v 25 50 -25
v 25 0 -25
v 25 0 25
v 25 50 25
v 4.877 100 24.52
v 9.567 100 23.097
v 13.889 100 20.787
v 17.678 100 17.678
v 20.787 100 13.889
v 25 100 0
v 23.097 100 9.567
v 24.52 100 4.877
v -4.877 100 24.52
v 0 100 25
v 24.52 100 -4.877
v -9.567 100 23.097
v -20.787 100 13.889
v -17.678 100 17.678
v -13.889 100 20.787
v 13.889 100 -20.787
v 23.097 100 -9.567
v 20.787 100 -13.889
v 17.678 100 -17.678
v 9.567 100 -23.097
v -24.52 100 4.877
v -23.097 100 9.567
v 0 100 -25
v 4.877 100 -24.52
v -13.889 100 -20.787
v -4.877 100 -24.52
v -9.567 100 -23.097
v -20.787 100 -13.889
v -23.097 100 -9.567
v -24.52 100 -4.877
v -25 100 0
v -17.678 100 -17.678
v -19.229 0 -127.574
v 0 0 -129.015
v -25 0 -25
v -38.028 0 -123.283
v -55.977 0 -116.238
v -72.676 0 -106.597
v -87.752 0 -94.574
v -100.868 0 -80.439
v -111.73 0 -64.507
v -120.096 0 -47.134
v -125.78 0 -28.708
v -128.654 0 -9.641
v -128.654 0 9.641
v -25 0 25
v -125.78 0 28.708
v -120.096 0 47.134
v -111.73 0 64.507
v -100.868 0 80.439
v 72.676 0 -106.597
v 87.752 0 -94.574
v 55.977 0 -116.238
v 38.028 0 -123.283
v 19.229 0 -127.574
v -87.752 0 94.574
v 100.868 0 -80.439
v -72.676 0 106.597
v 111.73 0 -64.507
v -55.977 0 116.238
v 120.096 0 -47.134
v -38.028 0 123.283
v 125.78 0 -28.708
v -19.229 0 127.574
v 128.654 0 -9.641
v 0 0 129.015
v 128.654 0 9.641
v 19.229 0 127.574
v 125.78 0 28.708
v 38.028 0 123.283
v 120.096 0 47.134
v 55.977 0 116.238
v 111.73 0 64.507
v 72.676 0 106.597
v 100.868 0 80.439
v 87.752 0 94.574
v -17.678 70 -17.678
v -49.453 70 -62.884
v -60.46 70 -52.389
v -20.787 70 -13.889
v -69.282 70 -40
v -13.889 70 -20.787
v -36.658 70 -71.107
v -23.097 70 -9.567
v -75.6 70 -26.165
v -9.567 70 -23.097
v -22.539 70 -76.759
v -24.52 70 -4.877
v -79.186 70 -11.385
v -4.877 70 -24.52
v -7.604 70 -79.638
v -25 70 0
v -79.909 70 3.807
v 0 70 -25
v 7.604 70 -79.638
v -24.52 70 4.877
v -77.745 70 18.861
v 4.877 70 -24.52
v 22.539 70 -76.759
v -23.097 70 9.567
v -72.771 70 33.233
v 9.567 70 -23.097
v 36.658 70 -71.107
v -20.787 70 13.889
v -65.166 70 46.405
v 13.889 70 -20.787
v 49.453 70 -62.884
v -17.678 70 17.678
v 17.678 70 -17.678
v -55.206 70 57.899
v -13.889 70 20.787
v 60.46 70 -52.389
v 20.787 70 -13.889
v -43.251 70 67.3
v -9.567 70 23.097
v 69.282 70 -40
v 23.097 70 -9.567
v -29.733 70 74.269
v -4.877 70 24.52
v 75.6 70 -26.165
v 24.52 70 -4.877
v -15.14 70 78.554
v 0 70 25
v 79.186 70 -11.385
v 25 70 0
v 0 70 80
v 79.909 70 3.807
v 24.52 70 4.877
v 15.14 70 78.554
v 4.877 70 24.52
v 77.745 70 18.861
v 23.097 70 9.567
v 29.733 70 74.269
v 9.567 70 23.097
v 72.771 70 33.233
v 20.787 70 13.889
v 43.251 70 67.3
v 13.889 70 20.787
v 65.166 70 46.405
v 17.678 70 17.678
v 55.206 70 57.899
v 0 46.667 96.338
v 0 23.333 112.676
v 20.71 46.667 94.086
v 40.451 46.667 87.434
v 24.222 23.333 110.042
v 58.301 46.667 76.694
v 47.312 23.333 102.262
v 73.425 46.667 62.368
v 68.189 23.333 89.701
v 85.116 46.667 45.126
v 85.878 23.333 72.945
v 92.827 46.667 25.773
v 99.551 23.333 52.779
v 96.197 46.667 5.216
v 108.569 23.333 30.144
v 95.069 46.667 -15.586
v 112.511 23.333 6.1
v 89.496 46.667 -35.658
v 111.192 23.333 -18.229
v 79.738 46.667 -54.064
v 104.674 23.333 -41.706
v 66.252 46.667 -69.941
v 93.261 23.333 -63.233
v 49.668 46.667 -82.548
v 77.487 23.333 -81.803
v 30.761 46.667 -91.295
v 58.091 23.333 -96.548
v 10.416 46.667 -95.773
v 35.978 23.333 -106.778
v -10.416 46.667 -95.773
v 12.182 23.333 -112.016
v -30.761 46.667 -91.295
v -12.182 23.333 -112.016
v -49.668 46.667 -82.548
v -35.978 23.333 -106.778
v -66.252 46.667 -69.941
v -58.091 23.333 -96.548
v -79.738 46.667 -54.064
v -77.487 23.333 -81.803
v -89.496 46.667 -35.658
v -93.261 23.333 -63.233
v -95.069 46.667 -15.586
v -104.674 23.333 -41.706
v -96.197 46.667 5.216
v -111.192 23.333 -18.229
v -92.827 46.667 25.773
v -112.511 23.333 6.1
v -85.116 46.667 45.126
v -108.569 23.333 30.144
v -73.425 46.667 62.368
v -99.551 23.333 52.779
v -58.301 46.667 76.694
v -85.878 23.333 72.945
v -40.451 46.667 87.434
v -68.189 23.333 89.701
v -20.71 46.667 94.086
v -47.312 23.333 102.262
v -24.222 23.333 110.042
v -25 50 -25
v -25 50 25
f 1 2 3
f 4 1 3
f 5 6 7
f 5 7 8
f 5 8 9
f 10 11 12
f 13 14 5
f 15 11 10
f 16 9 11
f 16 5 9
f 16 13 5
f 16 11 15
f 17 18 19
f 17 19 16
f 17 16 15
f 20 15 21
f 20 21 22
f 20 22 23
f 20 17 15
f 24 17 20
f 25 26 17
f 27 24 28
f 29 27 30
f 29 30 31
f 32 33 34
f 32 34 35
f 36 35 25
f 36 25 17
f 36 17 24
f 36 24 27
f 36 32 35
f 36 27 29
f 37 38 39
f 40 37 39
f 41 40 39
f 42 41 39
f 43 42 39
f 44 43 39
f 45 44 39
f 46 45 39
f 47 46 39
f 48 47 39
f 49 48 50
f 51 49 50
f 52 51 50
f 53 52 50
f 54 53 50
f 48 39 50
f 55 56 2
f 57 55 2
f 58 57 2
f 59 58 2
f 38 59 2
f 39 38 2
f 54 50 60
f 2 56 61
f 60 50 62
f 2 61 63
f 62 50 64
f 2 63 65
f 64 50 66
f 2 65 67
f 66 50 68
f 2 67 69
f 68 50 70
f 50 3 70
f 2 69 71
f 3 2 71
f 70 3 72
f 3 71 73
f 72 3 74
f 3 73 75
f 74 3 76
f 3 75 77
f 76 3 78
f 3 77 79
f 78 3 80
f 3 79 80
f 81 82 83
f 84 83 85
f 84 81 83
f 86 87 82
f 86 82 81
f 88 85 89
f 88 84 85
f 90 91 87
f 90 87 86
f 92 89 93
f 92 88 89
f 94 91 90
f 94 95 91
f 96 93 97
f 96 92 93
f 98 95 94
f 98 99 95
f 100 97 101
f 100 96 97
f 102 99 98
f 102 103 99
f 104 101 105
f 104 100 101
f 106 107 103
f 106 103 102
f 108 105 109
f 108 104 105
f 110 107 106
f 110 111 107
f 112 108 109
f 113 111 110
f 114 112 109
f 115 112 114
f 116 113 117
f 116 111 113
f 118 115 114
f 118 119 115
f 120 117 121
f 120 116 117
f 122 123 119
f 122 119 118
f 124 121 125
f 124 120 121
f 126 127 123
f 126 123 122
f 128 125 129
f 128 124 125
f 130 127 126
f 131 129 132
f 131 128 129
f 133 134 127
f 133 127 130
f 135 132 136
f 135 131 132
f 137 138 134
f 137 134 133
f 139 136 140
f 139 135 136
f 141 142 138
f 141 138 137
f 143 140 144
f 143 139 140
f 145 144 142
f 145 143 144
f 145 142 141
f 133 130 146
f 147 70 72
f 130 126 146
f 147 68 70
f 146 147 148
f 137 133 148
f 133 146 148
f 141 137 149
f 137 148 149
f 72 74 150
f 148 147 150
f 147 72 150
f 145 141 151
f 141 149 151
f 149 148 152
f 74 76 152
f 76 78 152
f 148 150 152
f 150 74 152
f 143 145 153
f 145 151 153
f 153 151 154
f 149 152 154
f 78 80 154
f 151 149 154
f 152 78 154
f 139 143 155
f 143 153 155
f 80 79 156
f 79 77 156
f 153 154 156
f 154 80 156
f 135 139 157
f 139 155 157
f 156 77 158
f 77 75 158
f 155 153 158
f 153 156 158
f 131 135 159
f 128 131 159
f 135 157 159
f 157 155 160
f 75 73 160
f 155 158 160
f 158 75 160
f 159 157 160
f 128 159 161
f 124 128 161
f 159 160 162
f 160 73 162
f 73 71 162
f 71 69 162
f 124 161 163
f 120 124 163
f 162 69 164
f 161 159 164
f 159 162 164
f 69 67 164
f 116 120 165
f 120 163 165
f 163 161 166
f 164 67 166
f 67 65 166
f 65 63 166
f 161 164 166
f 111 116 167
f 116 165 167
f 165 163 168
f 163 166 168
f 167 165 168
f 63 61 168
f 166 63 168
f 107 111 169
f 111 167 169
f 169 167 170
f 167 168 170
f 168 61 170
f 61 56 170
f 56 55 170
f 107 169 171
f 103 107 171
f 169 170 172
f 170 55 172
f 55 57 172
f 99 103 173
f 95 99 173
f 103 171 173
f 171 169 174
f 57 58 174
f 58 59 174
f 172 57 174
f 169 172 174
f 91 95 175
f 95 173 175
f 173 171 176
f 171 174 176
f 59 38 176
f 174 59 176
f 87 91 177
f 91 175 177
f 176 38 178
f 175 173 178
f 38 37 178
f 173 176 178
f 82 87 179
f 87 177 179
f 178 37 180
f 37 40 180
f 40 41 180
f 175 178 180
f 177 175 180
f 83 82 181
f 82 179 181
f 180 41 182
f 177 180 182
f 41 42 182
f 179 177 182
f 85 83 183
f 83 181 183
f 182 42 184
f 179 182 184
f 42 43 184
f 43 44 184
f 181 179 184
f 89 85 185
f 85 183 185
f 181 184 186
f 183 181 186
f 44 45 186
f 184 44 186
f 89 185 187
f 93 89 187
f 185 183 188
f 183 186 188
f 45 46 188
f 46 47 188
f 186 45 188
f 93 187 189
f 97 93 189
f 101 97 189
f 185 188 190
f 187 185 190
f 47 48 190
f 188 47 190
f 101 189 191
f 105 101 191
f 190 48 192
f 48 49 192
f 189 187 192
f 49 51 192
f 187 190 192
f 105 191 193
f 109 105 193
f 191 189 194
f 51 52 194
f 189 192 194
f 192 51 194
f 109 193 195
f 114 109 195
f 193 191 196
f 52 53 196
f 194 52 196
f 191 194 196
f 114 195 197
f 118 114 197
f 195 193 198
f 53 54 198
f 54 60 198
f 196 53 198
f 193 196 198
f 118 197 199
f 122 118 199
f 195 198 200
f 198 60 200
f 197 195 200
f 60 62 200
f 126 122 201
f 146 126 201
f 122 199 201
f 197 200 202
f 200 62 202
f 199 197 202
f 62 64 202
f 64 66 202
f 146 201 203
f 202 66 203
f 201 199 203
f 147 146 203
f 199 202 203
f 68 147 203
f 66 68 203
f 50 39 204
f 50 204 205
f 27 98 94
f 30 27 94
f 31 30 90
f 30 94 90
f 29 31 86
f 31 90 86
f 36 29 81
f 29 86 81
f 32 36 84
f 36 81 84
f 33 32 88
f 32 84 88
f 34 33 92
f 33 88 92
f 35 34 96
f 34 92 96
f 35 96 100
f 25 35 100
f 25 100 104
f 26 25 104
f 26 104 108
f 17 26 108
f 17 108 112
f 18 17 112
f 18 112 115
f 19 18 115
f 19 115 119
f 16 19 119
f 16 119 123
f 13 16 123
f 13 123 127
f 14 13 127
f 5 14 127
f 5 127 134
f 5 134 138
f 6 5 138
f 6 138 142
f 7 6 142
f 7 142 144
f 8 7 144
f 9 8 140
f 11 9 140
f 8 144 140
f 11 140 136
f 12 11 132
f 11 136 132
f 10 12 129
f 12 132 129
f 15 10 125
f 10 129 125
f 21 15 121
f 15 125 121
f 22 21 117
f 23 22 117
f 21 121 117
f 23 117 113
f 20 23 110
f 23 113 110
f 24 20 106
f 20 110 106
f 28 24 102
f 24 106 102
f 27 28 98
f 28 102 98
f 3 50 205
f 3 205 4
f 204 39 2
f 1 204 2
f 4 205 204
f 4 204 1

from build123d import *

# Parameters (mm, degrees)
SKETCH1_R           = 25
BOSS_EXTRUDE1_DEPTH = 100
SKETCH2_R           = 80
BOSS_EXTRUDE2_DEPTH = 70
DRAFT1_ANGLE        = 35
SKETCH4_W           = 50
SKETCH4_H           = 50
CUT_EXTRUDE1_DEPTH  = 50


with BuildPart() as part:
    # Sketch1 → Boss-Extrude1 (new body)
    with BuildSketch(Plane(origin=(0, 0, 0), x_dir=(1, 0, 0), z_dir=(0, 1, 0))):
        with Locations(Location((0, 0, 0), (0, 0, 90))):
            Circle(SKETCH1_R)
    extrude(amount=BOSS_EXTRUDE1_DEPTH)

    # Sketch2 → Boss-Extrude2 (add)
    with BuildSketch(Plane(origin=(0, 0, 0), x_dir=(1, 0, 0), z_dir=(0, 1, 0))):
        with Locations(Location((0, 0, 0), (0, 0, 270))):
            Circle(SKETCH2_R)
    extrude(amount=BOSS_EXTRUDE2_DEPTH)

    # Draft1
    draft1_faces = [part.faces().sort_by_distance(p)[0] for p in [
        (0, 35, -80),
    ]]
    draft(draft1_faces, Plane.ZX.offset(70), DRAFT1_ANGLE)

    # Sketch4 → Cut-Extrude1 (cut)
    with BuildSketch(Plane.XZ):
        Rectangle(SKETCH4_W, SKETCH4_H)
    extrude(amount=-CUT_EXTRUDE1_DEPTH, mode=Mode.SUBTRACT)


solid = part.part
